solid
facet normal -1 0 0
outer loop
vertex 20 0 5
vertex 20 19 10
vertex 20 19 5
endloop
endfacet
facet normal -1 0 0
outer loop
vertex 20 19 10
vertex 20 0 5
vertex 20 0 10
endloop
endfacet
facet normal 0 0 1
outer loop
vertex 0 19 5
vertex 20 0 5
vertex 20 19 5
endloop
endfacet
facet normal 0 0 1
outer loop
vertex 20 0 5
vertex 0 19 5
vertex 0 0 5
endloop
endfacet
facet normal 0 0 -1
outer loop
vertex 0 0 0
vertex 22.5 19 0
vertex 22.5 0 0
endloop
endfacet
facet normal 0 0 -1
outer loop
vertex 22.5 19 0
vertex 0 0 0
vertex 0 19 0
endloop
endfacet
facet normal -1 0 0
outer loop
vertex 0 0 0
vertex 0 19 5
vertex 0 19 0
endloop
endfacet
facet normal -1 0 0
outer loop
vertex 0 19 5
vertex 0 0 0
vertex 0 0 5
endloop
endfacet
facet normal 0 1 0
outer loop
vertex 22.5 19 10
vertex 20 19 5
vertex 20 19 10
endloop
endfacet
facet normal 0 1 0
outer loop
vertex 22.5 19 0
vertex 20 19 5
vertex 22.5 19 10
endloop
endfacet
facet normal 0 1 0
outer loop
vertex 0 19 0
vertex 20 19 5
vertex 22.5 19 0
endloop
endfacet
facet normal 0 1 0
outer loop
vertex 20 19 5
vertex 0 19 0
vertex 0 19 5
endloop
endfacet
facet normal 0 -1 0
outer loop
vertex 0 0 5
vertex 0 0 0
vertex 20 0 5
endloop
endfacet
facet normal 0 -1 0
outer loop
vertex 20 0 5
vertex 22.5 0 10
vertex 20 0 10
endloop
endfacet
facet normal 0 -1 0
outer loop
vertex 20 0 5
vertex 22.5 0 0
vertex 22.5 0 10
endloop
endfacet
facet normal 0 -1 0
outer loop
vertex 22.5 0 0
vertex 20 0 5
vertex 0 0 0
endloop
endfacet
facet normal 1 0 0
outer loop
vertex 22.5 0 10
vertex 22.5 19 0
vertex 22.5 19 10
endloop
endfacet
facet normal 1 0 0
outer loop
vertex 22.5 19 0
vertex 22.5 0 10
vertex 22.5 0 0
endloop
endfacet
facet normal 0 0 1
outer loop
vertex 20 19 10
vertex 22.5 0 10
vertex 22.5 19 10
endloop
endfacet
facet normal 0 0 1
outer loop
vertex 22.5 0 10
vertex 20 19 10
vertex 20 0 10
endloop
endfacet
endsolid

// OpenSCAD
//L bracket for DJI S1000
// The wedge is the bottom part of the L that fills the gap.
// The upper part of the L parallels the base plate.

// Thickness of wedge
t_w=2.5;

// Width of upper and width of wedge
w=19;

// Length of upper piece not including wedge (height of the upper part of L not including the bottom part)
l_u=20;

// Thickness of upper part.
t_u=5;

// Length of wedge
l_w=10;

union() {
  cube([l_u,w,t_u]);
  translate ([l_u,0,0]){
    cube([t_w,w,l_w]);
  }
}
